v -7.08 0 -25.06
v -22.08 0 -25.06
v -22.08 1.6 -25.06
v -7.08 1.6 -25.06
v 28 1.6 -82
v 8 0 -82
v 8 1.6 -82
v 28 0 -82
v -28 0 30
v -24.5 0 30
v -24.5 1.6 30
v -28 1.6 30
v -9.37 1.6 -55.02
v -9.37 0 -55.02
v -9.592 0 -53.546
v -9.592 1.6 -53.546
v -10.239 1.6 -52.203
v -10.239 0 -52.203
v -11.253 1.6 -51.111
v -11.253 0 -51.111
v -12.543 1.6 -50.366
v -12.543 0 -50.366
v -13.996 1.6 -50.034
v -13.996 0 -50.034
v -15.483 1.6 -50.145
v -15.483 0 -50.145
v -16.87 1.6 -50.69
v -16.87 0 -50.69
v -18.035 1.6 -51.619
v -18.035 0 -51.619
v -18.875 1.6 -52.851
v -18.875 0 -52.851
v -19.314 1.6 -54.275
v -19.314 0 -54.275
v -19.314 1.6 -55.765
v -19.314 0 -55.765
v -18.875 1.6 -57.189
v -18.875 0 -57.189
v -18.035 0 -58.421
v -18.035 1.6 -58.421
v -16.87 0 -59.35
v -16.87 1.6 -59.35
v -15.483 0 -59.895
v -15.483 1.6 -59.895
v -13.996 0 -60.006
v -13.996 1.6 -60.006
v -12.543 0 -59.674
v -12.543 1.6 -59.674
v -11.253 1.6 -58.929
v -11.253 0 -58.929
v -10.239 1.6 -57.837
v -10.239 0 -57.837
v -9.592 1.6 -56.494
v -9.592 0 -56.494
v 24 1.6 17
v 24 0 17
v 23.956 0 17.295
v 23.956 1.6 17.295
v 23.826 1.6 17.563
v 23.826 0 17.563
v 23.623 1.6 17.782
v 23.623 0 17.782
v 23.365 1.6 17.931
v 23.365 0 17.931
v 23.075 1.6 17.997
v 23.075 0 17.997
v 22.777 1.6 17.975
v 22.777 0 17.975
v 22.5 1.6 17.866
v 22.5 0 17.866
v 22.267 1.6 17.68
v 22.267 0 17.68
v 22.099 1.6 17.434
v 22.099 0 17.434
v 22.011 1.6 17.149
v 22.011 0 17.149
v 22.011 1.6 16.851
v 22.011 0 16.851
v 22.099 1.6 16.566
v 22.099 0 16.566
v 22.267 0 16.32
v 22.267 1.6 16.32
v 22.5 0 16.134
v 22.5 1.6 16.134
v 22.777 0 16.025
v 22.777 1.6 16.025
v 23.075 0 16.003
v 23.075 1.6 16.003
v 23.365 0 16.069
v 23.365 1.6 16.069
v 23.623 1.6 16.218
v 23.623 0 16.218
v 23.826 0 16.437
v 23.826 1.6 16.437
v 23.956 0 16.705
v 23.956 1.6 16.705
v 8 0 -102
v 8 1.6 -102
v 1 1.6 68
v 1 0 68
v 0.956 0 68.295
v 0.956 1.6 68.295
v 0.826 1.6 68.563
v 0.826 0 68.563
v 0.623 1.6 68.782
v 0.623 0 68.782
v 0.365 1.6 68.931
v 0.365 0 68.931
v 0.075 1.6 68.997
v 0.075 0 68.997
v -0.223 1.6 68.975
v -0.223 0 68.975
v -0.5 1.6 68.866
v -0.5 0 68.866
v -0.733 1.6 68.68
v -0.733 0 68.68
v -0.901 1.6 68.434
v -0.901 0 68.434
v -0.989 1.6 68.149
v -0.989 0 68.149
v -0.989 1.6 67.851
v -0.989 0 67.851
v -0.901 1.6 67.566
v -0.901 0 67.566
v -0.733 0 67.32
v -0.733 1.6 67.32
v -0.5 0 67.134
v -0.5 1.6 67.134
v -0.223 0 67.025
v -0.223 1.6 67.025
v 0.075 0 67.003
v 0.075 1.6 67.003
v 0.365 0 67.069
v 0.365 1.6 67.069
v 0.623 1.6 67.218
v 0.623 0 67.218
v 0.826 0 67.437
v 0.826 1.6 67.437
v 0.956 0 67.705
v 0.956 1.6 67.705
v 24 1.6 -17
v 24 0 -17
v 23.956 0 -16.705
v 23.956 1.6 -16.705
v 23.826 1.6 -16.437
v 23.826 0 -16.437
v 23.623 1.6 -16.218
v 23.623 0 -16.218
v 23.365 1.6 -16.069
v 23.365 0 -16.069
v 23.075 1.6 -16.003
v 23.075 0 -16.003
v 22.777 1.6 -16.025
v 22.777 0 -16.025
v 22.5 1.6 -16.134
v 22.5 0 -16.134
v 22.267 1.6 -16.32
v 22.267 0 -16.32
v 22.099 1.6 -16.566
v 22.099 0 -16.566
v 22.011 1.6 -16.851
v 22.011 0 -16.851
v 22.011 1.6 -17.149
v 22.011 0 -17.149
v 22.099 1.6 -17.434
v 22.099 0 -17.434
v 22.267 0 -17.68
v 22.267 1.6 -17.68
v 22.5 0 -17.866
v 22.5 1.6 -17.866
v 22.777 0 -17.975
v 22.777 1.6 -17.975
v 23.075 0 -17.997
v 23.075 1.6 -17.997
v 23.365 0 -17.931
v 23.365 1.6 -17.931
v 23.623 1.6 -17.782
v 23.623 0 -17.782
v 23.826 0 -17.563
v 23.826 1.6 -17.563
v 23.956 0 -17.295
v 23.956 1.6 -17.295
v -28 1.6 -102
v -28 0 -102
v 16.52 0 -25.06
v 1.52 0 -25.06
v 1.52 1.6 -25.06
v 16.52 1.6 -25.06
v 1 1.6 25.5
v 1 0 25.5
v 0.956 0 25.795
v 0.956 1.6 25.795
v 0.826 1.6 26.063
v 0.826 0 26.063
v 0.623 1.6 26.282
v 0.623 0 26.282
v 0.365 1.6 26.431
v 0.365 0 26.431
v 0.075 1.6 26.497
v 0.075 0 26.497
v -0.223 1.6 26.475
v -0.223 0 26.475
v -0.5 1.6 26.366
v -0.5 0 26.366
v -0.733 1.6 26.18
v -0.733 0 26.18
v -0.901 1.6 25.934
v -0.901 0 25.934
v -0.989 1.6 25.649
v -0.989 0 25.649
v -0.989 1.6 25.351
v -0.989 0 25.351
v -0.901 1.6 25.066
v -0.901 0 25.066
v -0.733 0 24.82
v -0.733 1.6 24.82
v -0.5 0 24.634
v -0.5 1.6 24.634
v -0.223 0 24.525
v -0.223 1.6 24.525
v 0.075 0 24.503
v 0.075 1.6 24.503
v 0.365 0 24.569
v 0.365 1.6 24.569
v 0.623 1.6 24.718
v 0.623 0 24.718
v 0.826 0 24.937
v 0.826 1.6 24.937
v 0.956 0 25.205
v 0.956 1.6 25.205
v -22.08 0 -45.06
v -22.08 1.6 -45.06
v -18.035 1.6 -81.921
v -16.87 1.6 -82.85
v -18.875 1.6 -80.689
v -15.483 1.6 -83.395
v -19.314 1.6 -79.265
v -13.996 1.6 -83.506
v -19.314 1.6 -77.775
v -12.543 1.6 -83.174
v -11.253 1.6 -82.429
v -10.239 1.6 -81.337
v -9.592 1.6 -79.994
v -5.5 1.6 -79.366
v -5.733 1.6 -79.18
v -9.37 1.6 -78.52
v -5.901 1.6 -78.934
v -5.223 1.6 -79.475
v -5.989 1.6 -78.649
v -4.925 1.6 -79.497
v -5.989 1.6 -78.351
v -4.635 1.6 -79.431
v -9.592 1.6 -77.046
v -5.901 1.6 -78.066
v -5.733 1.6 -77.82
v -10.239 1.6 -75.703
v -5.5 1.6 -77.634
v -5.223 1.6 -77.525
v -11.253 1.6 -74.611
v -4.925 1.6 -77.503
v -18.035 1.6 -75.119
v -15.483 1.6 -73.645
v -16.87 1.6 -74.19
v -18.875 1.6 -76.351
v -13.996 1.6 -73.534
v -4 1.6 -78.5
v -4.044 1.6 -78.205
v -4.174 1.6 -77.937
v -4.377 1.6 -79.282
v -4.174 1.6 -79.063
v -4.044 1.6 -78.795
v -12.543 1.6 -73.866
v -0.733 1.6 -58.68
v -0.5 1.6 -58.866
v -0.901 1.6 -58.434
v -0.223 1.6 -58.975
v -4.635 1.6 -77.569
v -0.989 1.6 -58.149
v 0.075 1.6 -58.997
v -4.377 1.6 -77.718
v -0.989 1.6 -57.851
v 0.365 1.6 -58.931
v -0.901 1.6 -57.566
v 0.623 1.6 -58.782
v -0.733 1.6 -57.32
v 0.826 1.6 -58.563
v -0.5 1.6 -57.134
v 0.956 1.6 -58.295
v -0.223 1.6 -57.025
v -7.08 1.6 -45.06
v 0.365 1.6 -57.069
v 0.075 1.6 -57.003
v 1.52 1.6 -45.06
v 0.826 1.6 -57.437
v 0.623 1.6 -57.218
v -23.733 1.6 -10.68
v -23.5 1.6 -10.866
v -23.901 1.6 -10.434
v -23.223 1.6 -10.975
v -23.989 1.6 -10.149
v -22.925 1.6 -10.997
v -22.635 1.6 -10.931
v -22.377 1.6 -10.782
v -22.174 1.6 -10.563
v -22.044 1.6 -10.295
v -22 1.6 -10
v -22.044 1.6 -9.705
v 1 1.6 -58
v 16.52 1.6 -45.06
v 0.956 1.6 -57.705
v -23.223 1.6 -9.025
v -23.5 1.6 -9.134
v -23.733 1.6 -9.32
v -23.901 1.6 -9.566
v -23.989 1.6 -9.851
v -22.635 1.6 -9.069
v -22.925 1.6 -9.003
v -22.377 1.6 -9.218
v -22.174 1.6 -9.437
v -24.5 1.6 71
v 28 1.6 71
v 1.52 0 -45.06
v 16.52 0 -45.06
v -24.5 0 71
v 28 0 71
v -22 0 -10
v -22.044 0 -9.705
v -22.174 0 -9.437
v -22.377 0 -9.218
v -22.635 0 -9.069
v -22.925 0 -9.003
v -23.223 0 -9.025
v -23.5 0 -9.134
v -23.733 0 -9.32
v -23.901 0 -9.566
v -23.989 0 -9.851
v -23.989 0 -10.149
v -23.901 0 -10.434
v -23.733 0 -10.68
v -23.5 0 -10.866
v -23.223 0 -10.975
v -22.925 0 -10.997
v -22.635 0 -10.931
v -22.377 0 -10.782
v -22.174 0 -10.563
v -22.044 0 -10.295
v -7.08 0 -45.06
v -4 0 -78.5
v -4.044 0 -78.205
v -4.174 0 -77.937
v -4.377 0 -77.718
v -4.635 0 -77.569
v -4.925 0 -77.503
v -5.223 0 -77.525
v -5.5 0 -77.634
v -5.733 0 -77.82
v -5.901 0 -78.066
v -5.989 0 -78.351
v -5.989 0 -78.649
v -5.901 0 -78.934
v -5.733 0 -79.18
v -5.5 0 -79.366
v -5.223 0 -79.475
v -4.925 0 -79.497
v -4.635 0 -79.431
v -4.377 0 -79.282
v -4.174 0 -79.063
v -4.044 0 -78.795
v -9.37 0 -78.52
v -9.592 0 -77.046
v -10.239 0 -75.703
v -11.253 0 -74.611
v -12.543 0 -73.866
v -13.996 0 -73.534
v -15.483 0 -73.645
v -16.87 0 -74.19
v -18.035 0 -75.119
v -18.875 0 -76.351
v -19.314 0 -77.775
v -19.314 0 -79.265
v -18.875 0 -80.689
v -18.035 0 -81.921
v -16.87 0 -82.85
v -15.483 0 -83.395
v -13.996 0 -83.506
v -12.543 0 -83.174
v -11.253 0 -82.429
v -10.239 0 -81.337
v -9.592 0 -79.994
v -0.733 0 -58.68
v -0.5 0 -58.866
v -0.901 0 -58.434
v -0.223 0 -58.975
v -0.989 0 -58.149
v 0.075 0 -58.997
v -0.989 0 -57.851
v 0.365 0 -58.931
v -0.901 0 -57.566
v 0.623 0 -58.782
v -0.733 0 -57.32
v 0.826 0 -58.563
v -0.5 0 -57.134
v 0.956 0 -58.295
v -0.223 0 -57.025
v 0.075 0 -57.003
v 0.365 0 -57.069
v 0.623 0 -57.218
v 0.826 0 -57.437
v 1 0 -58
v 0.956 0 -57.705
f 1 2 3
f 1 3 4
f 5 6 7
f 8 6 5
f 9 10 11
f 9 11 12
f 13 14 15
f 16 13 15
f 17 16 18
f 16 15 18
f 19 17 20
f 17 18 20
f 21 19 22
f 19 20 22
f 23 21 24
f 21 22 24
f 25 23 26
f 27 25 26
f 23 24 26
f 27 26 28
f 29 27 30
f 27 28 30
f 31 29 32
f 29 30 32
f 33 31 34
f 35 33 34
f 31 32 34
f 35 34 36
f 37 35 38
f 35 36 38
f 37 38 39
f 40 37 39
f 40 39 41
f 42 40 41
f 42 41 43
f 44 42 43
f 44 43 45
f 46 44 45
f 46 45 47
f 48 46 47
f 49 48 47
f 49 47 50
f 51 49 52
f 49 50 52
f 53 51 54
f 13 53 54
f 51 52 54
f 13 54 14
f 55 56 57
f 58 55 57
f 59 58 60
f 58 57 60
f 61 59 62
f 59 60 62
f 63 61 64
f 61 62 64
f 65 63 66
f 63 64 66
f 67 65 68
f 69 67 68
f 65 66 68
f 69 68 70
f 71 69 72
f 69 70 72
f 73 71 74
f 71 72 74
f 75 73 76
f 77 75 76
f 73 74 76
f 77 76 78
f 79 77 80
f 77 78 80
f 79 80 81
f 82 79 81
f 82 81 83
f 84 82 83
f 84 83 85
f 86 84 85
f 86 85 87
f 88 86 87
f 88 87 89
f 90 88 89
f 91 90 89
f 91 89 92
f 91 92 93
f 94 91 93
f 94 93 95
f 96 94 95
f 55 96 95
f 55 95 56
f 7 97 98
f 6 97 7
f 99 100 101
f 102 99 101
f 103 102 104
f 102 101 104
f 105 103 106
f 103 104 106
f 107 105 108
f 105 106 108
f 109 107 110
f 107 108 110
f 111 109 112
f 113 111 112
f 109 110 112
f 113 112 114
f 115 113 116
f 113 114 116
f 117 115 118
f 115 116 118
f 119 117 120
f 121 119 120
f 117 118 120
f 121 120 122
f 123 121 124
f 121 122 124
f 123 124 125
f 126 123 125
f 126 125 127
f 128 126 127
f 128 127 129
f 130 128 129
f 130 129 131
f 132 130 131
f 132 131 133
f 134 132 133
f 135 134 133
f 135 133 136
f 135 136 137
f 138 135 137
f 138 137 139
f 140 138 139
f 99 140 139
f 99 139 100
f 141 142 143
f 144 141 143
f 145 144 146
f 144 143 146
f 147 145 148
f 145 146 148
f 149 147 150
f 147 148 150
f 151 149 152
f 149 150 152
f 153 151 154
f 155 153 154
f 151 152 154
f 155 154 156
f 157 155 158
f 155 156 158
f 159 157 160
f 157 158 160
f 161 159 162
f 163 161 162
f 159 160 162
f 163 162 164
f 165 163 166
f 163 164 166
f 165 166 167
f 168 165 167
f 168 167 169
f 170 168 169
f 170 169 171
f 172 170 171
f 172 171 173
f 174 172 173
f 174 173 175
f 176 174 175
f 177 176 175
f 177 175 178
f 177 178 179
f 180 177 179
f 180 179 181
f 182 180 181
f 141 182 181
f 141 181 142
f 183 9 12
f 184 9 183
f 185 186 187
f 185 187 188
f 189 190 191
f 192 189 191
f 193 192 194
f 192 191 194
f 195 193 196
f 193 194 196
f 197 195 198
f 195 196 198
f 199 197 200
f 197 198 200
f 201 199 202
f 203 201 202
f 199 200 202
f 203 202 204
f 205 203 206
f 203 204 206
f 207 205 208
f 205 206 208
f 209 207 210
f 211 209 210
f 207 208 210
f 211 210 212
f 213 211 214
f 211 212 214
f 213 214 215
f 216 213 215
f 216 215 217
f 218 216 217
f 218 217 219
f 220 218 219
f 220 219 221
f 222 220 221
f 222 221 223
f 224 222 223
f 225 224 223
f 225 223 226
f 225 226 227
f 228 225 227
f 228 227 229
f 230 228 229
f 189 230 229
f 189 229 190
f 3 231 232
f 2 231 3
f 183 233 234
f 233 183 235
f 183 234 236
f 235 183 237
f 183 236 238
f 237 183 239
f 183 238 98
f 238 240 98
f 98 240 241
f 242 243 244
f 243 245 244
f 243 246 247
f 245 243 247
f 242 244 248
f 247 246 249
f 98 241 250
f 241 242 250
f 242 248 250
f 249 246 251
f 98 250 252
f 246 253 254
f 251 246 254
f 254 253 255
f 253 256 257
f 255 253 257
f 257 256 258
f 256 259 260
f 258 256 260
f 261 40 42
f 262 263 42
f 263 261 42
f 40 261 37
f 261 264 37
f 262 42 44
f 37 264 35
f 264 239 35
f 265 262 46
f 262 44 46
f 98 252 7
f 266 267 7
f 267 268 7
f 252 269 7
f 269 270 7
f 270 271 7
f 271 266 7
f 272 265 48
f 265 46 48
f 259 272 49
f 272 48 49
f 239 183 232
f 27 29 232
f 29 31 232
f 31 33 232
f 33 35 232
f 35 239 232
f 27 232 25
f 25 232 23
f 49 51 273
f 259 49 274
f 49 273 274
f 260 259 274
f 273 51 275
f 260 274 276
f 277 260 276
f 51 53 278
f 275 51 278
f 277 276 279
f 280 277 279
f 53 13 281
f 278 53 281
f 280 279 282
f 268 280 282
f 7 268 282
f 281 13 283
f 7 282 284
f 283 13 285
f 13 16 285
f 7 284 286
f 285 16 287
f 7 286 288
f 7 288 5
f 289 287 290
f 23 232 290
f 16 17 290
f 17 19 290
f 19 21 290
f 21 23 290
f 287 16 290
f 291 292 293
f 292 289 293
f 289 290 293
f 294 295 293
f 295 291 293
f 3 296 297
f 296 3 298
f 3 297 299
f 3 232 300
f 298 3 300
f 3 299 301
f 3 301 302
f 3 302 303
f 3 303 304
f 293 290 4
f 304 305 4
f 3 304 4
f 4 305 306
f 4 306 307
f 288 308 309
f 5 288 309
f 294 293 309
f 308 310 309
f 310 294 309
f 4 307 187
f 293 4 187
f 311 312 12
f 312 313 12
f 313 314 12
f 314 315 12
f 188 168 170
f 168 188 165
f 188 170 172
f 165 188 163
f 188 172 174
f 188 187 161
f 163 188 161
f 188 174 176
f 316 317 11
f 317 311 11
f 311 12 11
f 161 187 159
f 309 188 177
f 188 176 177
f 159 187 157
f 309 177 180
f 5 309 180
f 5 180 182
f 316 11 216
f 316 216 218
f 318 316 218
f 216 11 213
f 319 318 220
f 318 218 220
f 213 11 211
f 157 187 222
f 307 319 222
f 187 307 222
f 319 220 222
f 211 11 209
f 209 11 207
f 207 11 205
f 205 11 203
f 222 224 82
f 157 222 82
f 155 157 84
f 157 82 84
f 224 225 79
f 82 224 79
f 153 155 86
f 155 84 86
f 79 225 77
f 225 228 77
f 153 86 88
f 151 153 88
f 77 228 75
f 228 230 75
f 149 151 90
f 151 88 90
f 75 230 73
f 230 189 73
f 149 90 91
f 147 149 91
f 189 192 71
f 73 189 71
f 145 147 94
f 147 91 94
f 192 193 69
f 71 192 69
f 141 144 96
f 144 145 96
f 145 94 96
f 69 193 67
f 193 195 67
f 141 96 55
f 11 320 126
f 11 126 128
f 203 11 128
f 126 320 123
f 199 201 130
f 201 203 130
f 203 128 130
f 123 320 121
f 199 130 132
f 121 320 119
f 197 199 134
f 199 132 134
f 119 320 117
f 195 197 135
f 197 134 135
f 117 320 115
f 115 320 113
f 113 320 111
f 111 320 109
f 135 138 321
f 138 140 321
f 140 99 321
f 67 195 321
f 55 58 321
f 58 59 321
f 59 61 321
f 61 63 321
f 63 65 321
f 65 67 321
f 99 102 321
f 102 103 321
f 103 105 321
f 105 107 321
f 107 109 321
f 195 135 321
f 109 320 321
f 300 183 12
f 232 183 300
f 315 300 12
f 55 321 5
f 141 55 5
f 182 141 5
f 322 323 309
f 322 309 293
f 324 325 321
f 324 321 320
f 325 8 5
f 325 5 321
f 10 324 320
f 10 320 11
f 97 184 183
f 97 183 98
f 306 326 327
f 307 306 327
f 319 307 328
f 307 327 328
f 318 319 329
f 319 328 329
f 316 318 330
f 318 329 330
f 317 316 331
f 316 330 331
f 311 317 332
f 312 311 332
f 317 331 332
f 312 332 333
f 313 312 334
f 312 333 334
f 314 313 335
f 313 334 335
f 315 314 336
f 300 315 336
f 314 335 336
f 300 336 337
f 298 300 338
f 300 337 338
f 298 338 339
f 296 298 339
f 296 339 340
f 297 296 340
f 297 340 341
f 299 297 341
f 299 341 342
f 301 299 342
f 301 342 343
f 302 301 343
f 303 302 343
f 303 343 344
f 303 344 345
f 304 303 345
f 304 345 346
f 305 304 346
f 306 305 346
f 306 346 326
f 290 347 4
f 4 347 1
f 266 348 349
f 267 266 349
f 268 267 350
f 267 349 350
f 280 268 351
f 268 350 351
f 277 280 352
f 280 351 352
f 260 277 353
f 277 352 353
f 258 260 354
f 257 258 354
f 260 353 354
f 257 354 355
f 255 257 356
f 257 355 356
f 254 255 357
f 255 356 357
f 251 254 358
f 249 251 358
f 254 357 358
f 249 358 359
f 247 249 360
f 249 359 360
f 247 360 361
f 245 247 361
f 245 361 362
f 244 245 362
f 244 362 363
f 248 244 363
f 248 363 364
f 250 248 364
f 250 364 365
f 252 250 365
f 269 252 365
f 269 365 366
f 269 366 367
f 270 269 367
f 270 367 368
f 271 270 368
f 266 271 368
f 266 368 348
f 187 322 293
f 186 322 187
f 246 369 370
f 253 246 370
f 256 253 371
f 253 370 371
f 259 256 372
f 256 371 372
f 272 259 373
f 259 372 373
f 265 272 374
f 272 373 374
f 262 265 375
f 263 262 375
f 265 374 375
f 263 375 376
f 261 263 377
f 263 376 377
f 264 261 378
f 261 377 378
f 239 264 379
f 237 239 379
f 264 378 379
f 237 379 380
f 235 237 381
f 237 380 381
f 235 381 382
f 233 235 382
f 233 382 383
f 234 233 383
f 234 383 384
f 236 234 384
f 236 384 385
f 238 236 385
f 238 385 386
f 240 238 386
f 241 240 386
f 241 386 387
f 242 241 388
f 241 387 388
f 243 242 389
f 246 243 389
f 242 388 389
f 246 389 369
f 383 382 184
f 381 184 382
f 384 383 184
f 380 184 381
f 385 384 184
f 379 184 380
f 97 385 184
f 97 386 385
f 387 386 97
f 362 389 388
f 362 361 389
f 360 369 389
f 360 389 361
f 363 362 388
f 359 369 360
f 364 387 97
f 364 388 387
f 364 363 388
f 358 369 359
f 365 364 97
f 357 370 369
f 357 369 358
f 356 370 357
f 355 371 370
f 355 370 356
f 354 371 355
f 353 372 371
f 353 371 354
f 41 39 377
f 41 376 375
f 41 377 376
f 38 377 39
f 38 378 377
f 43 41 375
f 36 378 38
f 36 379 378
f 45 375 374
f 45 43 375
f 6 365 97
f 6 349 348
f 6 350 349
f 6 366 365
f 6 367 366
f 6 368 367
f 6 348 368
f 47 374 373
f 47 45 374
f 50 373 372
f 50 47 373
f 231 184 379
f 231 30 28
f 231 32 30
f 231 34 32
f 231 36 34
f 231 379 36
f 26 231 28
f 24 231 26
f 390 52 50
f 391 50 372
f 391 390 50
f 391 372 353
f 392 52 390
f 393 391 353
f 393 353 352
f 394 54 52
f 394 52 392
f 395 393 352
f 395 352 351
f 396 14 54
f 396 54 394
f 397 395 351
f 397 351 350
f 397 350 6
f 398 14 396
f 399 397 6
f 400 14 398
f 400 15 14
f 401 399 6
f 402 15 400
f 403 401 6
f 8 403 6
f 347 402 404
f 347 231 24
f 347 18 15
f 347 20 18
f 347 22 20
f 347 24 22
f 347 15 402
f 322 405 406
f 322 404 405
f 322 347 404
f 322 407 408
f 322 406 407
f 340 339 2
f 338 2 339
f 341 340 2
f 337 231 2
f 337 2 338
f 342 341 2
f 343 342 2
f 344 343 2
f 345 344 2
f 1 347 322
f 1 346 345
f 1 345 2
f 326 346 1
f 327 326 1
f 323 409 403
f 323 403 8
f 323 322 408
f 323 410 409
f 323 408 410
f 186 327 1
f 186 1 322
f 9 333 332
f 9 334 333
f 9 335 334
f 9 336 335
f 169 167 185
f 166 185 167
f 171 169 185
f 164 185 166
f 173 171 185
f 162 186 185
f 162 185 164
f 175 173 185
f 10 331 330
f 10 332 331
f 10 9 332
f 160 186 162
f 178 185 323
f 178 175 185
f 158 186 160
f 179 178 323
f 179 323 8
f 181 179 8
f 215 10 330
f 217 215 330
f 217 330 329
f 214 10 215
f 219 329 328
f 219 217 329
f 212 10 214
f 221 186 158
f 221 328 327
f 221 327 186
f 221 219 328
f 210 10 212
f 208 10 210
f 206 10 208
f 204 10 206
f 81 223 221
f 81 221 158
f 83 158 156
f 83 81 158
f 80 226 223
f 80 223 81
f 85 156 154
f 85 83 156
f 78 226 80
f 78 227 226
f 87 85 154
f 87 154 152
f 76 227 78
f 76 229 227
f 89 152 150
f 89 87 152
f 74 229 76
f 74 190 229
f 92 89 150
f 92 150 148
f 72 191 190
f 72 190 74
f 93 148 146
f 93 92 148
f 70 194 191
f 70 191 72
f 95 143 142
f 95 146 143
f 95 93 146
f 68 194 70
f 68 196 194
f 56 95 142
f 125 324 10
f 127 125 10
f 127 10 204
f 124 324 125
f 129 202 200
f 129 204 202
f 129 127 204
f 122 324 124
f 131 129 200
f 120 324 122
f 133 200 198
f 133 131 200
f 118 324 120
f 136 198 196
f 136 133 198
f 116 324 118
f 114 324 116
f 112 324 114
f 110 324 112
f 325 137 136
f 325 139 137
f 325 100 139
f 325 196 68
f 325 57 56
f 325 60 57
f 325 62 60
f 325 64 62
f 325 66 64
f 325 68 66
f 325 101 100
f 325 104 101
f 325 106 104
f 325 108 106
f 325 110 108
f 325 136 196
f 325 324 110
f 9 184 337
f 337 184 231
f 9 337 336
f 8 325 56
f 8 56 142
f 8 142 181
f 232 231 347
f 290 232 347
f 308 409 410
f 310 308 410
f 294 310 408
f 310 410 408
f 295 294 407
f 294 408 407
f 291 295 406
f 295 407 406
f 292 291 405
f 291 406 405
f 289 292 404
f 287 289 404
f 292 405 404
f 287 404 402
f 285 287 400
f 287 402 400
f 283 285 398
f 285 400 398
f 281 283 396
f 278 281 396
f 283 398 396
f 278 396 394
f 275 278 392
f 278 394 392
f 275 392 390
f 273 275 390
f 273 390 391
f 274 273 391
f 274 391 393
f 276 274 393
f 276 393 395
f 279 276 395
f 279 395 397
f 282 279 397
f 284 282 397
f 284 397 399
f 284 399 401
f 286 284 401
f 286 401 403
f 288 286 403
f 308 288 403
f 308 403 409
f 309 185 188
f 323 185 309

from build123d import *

# Parameters (mm, degrees)
F0_R     = 5
F0_W     = 15
F0_H     = 20
F1_DEPTH = 1.6
F2_R     = 1
F3_DEPTH = 25


with BuildPart() as f1:
    # F0 (on Front) → F1 (new body)
    with BuildSketch(Plane.XZ):
        Polygon((28, 71), (-24.5, 71), (-24.5, 30), (-28, 30), (-28, -102), (8, -102), (8, -82), (28, -82), align=None)
        with Locations((-14.37, -78.52)):
            Circle(F0_R, mode=Mode.SUBTRACT)
        with Locations((-14.37, -55.02)):
            Circle(F0_R, mode=Mode.SUBTRACT)
        with Locations((-14.58, -35.06)):
            Rectangle(F0_W, F0_H, mode=Mode.SUBTRACT)
        Polygon((1.52, -25.06), (9.02, -25.06), (16.52, -25.06), (16.52, -45.06), (9.02, -45.06), (1.52, -45.06), align=None, mode=Mode.SUBTRACT)
    extrude(amount=-F1_DEPTH)

    # F2 (on face) → F3 (cut)
    with BuildSketch(Plane.XZ):
        with Locations((0, 25.5)):
            Circle(F2_R)
        with Locations((0, 68)):
            Circle(F2_R)
        with Locations((23, 17)):
            Circle(F2_R)
        with Locations((23, -17)):
            Circle(F2_R)
        with Locations((-23, -10)):
            Circle(F2_R)
        with Locations((0, -58)):
            Circle(F2_R)
        with Locations((-5, -78.5)):
            Circle(F2_R)
    extrude(amount=-F3_DEPTH, mode=Mode.SUBTRACT)


solid = f1.part
